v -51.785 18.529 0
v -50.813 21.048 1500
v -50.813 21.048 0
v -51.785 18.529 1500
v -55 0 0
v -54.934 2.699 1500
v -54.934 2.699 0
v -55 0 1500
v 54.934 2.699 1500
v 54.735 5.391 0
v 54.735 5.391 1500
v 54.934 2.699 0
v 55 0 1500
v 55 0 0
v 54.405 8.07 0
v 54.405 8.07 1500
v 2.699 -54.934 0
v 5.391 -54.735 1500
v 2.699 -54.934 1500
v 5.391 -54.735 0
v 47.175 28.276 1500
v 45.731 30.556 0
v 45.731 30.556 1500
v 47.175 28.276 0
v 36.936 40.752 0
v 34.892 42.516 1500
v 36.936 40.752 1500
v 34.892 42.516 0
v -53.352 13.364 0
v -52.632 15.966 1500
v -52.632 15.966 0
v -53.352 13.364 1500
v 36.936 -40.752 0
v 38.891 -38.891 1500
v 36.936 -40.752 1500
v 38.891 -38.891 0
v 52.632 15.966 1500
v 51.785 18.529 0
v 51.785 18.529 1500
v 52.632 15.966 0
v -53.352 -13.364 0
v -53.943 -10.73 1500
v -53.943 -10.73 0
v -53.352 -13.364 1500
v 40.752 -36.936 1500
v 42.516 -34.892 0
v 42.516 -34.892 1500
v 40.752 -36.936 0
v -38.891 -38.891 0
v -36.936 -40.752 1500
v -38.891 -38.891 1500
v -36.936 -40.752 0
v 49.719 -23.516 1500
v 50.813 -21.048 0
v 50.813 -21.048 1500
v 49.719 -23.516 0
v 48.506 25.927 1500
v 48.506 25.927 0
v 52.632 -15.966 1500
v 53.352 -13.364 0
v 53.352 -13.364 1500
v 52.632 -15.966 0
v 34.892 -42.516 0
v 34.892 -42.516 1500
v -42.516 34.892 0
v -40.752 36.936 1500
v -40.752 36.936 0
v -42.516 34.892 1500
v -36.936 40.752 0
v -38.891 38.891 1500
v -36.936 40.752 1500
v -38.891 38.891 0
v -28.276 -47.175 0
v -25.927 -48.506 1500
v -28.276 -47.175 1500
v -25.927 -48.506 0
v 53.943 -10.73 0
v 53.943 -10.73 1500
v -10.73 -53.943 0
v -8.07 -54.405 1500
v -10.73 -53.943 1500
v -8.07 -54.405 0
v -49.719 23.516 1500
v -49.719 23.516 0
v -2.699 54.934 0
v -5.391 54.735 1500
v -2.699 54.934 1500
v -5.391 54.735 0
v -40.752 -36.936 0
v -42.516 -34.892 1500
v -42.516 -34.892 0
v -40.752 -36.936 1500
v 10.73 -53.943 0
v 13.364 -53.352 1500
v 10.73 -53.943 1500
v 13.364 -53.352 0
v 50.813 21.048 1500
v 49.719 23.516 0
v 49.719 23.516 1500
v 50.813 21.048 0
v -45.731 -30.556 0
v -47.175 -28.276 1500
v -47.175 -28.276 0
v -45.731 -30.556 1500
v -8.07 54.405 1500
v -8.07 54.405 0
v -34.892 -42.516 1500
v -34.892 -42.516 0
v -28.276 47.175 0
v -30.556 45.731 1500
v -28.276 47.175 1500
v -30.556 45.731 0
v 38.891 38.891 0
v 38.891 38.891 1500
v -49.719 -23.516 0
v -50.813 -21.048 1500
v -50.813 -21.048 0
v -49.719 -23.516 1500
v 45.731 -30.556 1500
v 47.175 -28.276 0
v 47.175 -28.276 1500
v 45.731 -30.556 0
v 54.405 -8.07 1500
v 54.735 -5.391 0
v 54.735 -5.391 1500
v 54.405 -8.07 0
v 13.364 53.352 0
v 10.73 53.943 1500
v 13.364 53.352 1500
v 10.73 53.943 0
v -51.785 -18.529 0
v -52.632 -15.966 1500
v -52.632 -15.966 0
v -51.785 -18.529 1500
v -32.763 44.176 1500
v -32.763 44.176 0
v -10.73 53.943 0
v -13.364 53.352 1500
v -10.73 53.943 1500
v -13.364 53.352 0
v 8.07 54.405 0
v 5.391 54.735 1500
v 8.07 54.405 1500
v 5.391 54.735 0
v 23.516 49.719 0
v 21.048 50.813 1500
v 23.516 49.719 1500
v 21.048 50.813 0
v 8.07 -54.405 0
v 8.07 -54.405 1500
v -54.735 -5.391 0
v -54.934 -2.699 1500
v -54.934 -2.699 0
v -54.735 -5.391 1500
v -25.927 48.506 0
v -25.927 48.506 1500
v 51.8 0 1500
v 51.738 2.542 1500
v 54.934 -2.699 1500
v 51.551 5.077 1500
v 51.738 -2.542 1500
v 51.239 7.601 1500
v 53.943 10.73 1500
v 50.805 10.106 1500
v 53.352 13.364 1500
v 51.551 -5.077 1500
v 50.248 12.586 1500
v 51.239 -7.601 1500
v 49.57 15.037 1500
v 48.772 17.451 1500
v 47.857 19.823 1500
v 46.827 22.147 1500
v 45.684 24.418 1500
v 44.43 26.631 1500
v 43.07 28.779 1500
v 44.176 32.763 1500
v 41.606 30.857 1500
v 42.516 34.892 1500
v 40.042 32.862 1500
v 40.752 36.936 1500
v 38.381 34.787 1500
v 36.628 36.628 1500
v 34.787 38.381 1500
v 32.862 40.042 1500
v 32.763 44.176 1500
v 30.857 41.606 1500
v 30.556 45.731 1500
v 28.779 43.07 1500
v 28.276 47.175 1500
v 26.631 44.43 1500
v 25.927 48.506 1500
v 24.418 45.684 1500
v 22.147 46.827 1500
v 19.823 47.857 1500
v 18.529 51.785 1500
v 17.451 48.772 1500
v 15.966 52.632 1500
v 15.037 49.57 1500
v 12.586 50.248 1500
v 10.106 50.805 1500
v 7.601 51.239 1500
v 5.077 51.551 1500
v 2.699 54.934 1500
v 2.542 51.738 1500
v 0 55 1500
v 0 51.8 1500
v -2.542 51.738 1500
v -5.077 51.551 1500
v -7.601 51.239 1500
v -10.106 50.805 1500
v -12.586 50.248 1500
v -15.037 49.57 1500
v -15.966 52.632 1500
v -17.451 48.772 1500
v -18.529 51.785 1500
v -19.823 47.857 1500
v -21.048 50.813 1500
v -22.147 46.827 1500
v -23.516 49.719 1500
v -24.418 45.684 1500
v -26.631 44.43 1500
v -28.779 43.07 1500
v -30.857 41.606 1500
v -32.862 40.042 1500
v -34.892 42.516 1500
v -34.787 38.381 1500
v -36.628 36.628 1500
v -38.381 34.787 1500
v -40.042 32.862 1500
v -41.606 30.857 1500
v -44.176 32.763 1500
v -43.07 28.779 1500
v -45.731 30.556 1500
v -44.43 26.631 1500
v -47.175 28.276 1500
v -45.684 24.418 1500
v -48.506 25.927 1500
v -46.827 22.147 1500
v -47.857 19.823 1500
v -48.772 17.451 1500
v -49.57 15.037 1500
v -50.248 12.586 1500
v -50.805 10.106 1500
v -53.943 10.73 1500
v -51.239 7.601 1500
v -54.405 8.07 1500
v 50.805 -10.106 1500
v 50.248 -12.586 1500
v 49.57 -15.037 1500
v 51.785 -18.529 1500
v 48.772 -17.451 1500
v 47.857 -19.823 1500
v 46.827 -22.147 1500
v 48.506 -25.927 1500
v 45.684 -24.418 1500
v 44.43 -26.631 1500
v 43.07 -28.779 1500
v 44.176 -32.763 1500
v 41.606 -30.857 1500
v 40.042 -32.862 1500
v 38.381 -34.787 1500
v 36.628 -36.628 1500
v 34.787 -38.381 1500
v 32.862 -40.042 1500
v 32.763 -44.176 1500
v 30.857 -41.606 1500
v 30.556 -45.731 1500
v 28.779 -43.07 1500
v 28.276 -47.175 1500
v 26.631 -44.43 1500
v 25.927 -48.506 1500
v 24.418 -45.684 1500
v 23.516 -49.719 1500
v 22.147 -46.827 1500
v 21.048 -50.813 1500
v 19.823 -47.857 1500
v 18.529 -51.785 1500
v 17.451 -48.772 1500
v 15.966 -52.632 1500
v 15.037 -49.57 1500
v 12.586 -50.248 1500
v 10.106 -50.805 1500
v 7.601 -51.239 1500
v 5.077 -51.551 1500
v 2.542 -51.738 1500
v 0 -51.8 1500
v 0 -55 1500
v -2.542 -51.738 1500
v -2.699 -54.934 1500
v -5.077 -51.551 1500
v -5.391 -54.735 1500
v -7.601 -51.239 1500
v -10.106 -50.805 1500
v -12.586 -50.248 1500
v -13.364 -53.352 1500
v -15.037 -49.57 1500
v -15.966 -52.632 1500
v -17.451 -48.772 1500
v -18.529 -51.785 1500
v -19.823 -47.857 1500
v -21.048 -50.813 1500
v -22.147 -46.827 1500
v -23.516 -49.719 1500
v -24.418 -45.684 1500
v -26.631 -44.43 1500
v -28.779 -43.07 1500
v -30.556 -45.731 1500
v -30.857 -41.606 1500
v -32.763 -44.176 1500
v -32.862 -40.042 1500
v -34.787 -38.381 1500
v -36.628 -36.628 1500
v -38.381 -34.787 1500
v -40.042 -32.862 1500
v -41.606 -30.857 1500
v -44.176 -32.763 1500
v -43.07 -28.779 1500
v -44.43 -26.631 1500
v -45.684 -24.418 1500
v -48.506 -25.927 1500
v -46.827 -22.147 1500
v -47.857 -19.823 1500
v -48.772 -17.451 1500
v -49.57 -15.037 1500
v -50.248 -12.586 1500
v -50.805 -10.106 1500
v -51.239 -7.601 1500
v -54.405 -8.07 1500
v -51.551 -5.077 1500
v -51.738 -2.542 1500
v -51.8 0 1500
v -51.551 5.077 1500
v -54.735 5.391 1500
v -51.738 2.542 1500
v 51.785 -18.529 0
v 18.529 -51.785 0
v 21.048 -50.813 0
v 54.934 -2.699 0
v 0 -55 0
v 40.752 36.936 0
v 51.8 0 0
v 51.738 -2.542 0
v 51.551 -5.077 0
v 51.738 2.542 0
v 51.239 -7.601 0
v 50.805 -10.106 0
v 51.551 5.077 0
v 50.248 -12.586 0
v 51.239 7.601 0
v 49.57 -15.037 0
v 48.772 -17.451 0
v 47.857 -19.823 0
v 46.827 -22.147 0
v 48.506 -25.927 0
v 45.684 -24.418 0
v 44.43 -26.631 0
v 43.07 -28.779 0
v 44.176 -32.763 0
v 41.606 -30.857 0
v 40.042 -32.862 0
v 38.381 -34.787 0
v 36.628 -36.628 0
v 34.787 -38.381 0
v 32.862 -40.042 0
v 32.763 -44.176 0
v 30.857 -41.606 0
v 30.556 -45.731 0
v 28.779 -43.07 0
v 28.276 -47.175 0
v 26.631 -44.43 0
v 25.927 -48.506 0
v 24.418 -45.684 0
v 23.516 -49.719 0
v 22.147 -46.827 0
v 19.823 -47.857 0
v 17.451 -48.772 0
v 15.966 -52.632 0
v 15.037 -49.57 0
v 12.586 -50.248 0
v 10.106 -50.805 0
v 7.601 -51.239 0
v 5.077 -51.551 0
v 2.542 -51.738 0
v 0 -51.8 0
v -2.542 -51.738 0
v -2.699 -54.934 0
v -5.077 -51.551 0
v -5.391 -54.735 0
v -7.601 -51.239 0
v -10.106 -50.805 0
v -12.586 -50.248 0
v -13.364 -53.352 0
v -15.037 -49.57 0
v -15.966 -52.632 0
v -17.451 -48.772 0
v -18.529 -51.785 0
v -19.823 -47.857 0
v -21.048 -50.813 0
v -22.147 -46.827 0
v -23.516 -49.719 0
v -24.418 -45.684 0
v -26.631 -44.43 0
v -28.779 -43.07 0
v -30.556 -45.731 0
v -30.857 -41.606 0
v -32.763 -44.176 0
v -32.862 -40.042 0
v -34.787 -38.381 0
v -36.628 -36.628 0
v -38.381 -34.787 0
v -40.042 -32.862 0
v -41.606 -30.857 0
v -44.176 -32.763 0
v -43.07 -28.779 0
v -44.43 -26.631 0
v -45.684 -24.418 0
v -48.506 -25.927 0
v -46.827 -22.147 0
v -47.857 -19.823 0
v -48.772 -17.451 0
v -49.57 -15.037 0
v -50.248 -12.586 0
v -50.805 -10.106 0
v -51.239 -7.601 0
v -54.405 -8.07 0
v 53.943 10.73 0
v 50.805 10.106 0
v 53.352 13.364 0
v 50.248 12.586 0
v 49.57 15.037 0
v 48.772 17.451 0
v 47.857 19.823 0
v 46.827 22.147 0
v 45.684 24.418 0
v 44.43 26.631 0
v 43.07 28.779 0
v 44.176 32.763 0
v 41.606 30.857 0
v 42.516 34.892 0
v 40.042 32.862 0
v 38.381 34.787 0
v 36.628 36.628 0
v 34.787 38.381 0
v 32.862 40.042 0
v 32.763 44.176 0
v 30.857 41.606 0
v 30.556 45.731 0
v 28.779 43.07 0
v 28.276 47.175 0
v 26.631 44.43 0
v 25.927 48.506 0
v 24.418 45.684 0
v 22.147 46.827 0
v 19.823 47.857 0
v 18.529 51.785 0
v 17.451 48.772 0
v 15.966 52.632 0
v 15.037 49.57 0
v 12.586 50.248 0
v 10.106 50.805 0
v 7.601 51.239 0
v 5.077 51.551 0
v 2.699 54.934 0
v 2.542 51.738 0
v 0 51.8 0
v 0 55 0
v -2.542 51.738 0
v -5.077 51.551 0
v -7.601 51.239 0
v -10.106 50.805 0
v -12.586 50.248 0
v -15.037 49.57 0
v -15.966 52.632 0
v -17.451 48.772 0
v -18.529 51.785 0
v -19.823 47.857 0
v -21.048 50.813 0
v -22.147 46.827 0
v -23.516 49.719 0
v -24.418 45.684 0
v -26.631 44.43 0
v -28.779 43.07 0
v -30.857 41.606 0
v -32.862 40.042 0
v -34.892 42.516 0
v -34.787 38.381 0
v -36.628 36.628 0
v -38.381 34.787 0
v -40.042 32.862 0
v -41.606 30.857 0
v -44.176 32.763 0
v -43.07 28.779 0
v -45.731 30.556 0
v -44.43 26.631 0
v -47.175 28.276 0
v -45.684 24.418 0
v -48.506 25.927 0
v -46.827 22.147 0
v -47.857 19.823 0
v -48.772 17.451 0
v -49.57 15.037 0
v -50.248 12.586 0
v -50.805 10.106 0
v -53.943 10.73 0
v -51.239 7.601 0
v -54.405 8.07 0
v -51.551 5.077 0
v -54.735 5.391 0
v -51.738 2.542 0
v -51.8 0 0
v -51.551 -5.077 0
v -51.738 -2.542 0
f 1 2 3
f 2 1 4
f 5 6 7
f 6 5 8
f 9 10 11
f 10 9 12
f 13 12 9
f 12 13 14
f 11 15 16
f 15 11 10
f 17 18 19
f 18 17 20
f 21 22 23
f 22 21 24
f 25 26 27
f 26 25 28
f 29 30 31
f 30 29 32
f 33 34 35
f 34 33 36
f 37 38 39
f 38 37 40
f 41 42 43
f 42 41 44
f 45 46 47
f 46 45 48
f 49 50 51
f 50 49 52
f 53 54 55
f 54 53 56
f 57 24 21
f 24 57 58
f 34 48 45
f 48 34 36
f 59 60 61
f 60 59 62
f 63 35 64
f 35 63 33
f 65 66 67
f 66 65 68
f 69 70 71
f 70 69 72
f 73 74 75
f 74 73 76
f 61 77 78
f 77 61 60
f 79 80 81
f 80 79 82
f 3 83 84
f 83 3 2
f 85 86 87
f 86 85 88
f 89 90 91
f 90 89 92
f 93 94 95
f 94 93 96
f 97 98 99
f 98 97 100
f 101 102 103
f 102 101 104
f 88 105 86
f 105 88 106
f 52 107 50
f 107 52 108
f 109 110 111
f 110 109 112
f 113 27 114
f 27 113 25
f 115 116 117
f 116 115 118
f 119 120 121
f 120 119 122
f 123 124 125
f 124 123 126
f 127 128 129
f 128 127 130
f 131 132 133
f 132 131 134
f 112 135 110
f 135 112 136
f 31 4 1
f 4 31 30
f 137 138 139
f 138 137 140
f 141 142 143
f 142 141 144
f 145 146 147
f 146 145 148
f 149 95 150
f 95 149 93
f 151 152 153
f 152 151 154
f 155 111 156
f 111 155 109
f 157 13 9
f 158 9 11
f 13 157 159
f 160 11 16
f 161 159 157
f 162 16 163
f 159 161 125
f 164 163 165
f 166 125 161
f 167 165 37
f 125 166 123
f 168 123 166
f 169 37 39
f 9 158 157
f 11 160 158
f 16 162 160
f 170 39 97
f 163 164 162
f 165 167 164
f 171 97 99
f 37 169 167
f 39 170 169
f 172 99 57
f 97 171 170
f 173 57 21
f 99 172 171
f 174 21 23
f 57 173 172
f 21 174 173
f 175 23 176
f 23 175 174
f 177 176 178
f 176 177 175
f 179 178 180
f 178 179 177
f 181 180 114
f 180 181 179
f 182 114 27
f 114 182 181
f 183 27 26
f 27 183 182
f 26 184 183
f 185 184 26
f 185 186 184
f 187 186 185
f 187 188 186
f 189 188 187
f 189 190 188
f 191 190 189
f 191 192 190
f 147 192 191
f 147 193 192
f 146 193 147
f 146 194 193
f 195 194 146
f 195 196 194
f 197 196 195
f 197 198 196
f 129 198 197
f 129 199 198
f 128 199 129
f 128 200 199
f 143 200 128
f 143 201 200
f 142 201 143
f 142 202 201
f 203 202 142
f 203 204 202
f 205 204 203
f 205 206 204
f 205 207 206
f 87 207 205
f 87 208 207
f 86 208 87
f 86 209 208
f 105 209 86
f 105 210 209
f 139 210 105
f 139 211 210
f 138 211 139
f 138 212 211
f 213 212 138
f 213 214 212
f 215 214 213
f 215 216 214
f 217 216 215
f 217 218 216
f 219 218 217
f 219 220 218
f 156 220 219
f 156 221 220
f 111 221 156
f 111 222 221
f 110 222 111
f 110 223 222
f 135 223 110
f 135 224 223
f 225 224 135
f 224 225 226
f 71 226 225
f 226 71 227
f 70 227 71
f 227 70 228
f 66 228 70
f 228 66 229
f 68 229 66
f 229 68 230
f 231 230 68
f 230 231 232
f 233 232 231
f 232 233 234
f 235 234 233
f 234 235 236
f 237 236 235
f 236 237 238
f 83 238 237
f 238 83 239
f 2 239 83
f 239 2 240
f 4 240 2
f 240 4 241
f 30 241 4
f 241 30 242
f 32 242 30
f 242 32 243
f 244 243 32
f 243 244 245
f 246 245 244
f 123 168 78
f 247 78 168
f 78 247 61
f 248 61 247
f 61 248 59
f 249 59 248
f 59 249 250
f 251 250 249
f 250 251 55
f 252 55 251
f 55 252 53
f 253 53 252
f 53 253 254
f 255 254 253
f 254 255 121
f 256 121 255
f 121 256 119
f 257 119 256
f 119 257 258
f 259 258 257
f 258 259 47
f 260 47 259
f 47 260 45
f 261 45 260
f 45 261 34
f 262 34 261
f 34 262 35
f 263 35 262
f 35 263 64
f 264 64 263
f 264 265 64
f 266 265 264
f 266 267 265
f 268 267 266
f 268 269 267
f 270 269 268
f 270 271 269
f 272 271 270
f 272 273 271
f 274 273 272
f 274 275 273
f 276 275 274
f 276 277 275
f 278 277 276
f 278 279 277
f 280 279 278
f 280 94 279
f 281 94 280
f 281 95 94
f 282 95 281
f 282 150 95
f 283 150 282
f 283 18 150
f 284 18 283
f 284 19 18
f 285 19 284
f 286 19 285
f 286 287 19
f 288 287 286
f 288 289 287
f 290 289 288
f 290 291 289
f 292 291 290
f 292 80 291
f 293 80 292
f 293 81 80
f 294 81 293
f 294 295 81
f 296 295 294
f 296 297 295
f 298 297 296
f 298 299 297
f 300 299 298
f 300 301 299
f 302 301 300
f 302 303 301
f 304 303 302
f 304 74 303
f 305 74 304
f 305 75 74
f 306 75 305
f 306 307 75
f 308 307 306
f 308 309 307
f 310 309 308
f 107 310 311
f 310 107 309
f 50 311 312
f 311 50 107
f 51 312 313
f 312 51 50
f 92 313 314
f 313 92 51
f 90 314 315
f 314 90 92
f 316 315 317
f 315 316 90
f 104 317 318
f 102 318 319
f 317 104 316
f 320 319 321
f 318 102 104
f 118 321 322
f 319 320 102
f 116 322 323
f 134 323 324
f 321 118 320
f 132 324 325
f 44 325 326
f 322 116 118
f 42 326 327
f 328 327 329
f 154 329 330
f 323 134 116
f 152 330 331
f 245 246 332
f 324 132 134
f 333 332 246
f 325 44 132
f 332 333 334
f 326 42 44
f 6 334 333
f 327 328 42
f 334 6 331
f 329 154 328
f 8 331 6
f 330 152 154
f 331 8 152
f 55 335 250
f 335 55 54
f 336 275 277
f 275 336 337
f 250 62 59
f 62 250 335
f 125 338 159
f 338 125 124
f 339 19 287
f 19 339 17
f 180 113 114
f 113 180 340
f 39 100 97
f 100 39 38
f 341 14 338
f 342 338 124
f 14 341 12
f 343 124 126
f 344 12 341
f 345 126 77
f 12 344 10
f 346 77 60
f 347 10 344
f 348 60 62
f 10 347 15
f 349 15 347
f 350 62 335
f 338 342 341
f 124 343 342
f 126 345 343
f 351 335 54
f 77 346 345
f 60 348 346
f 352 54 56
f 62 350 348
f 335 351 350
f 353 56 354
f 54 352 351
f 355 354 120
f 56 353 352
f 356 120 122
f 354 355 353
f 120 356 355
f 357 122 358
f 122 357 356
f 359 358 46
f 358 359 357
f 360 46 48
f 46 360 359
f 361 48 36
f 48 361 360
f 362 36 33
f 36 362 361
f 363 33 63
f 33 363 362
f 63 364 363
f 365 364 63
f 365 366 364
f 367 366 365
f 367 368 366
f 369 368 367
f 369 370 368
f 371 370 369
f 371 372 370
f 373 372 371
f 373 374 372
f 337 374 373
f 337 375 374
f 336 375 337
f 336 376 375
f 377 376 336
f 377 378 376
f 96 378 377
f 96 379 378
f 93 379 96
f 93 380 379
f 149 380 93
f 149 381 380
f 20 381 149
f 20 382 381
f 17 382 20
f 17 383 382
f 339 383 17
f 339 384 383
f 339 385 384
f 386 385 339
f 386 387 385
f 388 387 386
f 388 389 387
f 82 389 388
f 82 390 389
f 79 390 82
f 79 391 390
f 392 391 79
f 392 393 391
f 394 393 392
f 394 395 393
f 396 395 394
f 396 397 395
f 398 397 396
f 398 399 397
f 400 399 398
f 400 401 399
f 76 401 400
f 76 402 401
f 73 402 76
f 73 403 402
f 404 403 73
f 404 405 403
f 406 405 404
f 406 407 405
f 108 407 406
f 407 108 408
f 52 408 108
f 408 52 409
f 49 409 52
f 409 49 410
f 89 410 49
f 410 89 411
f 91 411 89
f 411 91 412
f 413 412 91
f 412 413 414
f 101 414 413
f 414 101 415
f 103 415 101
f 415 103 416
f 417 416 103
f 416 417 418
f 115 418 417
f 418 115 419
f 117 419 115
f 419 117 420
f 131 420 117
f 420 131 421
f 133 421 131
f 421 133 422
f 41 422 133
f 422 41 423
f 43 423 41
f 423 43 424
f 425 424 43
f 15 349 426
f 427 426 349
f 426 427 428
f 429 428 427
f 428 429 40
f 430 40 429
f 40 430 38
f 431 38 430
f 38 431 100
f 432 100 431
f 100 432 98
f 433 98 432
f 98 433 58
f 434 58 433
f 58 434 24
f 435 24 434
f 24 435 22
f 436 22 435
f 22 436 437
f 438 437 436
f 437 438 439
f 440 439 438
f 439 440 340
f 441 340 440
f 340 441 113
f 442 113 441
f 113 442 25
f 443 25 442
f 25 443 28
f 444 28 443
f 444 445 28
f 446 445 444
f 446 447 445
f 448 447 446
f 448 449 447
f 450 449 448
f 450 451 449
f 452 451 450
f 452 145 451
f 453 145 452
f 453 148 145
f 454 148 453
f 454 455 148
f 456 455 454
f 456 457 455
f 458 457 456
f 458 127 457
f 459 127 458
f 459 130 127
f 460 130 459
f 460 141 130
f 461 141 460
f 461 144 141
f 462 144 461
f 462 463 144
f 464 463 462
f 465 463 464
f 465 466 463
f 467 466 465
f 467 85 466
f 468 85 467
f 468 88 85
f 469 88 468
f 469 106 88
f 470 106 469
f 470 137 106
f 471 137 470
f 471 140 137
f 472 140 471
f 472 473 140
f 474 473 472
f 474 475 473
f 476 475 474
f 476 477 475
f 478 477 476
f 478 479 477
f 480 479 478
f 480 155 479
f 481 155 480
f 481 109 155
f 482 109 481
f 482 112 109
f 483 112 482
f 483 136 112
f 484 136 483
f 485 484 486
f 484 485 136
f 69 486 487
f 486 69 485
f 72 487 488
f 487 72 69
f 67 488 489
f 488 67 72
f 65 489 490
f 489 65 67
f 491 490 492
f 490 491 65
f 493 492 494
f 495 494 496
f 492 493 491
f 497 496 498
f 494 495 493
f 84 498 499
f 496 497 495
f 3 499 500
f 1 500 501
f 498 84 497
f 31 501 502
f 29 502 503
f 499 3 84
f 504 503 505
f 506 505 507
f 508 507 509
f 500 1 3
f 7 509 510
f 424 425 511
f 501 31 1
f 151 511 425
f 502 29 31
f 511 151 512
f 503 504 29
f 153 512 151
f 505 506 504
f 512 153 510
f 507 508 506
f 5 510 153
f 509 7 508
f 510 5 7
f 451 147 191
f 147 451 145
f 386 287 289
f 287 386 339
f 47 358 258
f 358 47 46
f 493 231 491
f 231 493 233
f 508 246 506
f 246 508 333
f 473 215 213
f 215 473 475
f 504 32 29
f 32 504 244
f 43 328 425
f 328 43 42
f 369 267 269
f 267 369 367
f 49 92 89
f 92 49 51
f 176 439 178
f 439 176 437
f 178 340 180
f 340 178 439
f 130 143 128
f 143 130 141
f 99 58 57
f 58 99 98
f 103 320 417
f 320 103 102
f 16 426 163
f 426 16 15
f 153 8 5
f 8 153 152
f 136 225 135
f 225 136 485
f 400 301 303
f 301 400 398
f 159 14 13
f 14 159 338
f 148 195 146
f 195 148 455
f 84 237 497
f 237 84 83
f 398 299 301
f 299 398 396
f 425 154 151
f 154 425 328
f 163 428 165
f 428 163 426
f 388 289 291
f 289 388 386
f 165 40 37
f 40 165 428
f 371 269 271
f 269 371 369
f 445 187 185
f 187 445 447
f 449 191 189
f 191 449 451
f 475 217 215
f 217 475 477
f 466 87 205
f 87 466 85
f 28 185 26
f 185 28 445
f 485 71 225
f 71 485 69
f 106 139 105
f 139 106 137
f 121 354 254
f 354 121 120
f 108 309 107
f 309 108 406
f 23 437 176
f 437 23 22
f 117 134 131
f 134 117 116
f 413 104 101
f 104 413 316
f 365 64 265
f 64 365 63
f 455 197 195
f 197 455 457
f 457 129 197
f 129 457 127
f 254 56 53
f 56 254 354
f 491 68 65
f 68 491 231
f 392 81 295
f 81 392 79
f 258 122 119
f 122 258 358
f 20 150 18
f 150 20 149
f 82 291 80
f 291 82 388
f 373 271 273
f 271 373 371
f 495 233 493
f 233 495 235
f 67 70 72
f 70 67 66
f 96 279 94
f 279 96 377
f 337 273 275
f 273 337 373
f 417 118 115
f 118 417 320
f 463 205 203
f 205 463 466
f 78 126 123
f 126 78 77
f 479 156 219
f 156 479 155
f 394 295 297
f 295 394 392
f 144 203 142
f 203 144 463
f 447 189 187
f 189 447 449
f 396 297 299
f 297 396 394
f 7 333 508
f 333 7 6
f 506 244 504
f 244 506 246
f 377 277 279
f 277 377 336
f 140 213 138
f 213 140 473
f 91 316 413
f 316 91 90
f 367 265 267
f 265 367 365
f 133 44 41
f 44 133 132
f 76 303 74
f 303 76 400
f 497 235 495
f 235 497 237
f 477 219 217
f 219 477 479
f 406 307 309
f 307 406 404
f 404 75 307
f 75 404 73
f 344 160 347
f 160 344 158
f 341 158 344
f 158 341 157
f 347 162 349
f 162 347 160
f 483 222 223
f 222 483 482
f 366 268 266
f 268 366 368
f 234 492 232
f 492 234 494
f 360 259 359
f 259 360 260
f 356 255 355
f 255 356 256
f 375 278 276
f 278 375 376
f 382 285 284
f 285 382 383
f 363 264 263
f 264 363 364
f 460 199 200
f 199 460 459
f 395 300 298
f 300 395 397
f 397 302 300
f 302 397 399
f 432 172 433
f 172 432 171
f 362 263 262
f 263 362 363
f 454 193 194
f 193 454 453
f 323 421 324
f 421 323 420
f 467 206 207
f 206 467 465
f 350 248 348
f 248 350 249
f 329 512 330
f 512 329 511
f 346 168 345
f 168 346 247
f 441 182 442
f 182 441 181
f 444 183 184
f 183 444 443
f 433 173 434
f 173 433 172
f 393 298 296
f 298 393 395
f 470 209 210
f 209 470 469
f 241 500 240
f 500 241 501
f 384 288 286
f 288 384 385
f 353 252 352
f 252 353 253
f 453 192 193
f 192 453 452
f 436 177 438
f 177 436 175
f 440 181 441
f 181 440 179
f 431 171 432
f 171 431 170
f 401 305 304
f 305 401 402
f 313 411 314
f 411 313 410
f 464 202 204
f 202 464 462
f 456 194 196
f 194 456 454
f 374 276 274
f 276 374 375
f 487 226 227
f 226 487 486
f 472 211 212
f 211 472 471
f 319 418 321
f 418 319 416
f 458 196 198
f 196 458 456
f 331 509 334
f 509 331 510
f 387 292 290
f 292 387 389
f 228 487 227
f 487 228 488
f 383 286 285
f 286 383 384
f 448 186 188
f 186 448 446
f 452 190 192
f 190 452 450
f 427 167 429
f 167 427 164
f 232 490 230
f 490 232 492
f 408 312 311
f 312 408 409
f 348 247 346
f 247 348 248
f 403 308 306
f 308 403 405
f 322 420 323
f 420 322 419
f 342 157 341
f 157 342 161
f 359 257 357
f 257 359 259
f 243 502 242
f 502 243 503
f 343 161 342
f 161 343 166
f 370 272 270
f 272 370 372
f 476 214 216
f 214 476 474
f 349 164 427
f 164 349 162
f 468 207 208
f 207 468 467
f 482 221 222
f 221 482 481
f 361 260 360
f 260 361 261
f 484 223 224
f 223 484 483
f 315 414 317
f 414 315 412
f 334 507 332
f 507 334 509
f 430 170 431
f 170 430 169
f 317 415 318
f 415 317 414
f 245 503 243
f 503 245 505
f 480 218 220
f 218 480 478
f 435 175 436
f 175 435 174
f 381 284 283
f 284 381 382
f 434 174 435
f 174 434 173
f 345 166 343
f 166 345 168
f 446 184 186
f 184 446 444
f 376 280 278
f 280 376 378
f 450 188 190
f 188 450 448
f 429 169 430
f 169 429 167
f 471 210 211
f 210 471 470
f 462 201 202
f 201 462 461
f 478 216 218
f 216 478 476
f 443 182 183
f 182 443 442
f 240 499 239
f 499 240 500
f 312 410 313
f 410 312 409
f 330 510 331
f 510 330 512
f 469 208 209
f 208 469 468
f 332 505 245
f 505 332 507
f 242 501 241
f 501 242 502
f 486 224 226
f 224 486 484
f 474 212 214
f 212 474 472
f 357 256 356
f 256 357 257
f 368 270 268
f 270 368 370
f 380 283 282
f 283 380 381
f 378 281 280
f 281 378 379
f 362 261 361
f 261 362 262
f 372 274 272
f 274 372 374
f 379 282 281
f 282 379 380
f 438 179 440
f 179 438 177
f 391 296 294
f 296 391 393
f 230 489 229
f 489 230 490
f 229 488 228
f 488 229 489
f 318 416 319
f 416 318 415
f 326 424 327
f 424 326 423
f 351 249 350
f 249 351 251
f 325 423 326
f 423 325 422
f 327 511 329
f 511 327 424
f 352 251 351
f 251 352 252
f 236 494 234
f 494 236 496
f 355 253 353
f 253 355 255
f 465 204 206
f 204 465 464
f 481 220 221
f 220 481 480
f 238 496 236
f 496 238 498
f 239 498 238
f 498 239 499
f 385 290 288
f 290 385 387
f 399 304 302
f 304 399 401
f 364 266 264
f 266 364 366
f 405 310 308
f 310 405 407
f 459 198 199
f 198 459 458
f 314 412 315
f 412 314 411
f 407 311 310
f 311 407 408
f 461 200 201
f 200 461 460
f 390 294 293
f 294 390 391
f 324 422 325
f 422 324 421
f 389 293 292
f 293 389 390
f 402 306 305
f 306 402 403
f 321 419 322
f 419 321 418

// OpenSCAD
$fn = 128;

// HT pipe parameters (approximate for HT 110)
pipe_length = 1500;          // mm
outer_diameter = 110;        // mm (nominal)
wall_thickness = 3.2;        // mm (typical for HT 110)
inner_diameter = outer_diameter - 2 * wall_thickness;

module ht_pipe(od, id, len) {
    difference() {
        cylinder(h = len, d = od);
        translate([0, 0, -0.5])
            cylinder(h = len + 1, d = id);
    }
}

ht_pipe(outer_diameter, inner_diameter, pipe_length);
